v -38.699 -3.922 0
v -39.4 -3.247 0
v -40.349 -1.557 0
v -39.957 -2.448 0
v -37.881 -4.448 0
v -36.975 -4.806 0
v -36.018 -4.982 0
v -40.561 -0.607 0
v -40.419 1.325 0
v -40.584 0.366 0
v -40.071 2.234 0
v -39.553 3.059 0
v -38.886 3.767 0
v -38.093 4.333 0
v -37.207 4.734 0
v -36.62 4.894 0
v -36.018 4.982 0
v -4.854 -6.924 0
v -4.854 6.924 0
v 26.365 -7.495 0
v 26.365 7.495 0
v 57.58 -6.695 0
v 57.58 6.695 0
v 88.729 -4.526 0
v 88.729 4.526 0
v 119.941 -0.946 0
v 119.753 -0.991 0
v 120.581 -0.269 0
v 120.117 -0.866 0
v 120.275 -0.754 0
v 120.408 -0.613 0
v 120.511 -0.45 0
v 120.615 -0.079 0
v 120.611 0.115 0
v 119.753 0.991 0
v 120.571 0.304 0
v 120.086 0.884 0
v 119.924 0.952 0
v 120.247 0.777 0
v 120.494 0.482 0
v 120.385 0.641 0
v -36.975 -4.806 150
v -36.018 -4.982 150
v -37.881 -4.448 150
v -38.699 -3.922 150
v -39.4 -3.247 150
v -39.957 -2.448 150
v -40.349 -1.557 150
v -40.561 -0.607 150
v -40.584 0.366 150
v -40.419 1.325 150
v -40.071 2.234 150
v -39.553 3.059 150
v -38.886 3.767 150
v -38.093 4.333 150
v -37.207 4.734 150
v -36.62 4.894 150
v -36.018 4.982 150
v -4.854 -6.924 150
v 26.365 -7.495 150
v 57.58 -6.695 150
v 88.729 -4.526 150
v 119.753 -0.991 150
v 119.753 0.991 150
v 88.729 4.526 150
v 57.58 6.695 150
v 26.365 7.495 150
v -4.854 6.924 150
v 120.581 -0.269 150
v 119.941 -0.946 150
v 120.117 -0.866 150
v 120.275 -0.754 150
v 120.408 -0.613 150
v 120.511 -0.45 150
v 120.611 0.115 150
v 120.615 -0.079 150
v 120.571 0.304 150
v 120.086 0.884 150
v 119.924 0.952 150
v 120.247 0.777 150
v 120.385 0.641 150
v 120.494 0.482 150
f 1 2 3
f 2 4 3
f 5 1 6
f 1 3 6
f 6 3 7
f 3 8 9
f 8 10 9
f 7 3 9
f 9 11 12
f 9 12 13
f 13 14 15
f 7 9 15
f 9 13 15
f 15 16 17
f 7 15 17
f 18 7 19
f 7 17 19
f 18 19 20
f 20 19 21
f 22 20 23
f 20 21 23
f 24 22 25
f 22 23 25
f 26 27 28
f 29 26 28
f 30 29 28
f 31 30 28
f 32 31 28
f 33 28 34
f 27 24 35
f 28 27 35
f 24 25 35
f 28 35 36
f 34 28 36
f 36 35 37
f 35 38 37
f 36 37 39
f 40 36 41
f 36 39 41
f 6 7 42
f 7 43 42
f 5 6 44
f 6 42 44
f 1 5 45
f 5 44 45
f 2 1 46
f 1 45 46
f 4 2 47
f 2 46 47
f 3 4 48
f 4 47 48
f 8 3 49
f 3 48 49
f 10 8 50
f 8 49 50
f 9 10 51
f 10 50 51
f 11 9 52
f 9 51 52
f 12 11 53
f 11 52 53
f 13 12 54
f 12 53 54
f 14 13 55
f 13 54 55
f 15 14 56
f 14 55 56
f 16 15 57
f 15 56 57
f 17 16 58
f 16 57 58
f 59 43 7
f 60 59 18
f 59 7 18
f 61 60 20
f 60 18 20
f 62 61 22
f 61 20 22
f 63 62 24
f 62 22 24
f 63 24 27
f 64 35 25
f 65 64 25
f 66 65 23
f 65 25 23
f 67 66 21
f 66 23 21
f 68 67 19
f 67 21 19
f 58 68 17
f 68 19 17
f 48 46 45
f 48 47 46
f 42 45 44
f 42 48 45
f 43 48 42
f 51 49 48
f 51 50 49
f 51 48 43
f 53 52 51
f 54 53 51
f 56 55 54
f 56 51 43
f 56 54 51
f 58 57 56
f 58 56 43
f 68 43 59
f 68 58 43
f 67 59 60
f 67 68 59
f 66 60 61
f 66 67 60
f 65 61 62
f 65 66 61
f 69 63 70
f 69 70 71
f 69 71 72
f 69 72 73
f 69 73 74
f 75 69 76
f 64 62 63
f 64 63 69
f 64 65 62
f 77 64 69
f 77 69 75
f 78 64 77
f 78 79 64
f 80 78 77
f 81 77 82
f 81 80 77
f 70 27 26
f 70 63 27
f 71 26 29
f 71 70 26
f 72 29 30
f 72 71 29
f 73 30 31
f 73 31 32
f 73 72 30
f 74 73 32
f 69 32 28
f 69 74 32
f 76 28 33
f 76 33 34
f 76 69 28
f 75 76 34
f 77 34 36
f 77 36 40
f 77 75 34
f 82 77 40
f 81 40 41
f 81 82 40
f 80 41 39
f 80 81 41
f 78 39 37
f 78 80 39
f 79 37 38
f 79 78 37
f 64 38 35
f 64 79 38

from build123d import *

# Parameters (mm, degrees)
F1_DEPTH = 150
F2_R     = 5
F3_R     = 1


with BuildPart() as f1:
    # F0 (on Top) → F1 (new body)
    with BuildSketch(Plane.XY):
        with BuildLine():
            Line((126.764090176, 0), (-79.235909824, 0))
            ThreePointArc((-79.235909824, 0), (23.764090176, -7.5), (126.764090176, 0))
        make_face()
        with BuildLine():
            ThreePointArc((126.764090176, 0), (23.764090176, 7.5), (-79.235909824, 0))
            Line((-79.235909824, 0), (126.764090176, 0))
        make_face()
    extrude(amount=F1_DEPTH)

    # F2
    f2_edges = [f1.edges().sort_by_distance(p)[0] for p in [
        (-79.23591, 0, 75),
    ]]
    fillet(f2_edges, radius=F2_R)

    # F3
    f3_edges = [f1.edges().sort_by_distance(p)[0] for p in [
        (126.76409, 0, 75),
    ]]
    fillet(f3_edges, radius=F3_R)


solid = f1.part
